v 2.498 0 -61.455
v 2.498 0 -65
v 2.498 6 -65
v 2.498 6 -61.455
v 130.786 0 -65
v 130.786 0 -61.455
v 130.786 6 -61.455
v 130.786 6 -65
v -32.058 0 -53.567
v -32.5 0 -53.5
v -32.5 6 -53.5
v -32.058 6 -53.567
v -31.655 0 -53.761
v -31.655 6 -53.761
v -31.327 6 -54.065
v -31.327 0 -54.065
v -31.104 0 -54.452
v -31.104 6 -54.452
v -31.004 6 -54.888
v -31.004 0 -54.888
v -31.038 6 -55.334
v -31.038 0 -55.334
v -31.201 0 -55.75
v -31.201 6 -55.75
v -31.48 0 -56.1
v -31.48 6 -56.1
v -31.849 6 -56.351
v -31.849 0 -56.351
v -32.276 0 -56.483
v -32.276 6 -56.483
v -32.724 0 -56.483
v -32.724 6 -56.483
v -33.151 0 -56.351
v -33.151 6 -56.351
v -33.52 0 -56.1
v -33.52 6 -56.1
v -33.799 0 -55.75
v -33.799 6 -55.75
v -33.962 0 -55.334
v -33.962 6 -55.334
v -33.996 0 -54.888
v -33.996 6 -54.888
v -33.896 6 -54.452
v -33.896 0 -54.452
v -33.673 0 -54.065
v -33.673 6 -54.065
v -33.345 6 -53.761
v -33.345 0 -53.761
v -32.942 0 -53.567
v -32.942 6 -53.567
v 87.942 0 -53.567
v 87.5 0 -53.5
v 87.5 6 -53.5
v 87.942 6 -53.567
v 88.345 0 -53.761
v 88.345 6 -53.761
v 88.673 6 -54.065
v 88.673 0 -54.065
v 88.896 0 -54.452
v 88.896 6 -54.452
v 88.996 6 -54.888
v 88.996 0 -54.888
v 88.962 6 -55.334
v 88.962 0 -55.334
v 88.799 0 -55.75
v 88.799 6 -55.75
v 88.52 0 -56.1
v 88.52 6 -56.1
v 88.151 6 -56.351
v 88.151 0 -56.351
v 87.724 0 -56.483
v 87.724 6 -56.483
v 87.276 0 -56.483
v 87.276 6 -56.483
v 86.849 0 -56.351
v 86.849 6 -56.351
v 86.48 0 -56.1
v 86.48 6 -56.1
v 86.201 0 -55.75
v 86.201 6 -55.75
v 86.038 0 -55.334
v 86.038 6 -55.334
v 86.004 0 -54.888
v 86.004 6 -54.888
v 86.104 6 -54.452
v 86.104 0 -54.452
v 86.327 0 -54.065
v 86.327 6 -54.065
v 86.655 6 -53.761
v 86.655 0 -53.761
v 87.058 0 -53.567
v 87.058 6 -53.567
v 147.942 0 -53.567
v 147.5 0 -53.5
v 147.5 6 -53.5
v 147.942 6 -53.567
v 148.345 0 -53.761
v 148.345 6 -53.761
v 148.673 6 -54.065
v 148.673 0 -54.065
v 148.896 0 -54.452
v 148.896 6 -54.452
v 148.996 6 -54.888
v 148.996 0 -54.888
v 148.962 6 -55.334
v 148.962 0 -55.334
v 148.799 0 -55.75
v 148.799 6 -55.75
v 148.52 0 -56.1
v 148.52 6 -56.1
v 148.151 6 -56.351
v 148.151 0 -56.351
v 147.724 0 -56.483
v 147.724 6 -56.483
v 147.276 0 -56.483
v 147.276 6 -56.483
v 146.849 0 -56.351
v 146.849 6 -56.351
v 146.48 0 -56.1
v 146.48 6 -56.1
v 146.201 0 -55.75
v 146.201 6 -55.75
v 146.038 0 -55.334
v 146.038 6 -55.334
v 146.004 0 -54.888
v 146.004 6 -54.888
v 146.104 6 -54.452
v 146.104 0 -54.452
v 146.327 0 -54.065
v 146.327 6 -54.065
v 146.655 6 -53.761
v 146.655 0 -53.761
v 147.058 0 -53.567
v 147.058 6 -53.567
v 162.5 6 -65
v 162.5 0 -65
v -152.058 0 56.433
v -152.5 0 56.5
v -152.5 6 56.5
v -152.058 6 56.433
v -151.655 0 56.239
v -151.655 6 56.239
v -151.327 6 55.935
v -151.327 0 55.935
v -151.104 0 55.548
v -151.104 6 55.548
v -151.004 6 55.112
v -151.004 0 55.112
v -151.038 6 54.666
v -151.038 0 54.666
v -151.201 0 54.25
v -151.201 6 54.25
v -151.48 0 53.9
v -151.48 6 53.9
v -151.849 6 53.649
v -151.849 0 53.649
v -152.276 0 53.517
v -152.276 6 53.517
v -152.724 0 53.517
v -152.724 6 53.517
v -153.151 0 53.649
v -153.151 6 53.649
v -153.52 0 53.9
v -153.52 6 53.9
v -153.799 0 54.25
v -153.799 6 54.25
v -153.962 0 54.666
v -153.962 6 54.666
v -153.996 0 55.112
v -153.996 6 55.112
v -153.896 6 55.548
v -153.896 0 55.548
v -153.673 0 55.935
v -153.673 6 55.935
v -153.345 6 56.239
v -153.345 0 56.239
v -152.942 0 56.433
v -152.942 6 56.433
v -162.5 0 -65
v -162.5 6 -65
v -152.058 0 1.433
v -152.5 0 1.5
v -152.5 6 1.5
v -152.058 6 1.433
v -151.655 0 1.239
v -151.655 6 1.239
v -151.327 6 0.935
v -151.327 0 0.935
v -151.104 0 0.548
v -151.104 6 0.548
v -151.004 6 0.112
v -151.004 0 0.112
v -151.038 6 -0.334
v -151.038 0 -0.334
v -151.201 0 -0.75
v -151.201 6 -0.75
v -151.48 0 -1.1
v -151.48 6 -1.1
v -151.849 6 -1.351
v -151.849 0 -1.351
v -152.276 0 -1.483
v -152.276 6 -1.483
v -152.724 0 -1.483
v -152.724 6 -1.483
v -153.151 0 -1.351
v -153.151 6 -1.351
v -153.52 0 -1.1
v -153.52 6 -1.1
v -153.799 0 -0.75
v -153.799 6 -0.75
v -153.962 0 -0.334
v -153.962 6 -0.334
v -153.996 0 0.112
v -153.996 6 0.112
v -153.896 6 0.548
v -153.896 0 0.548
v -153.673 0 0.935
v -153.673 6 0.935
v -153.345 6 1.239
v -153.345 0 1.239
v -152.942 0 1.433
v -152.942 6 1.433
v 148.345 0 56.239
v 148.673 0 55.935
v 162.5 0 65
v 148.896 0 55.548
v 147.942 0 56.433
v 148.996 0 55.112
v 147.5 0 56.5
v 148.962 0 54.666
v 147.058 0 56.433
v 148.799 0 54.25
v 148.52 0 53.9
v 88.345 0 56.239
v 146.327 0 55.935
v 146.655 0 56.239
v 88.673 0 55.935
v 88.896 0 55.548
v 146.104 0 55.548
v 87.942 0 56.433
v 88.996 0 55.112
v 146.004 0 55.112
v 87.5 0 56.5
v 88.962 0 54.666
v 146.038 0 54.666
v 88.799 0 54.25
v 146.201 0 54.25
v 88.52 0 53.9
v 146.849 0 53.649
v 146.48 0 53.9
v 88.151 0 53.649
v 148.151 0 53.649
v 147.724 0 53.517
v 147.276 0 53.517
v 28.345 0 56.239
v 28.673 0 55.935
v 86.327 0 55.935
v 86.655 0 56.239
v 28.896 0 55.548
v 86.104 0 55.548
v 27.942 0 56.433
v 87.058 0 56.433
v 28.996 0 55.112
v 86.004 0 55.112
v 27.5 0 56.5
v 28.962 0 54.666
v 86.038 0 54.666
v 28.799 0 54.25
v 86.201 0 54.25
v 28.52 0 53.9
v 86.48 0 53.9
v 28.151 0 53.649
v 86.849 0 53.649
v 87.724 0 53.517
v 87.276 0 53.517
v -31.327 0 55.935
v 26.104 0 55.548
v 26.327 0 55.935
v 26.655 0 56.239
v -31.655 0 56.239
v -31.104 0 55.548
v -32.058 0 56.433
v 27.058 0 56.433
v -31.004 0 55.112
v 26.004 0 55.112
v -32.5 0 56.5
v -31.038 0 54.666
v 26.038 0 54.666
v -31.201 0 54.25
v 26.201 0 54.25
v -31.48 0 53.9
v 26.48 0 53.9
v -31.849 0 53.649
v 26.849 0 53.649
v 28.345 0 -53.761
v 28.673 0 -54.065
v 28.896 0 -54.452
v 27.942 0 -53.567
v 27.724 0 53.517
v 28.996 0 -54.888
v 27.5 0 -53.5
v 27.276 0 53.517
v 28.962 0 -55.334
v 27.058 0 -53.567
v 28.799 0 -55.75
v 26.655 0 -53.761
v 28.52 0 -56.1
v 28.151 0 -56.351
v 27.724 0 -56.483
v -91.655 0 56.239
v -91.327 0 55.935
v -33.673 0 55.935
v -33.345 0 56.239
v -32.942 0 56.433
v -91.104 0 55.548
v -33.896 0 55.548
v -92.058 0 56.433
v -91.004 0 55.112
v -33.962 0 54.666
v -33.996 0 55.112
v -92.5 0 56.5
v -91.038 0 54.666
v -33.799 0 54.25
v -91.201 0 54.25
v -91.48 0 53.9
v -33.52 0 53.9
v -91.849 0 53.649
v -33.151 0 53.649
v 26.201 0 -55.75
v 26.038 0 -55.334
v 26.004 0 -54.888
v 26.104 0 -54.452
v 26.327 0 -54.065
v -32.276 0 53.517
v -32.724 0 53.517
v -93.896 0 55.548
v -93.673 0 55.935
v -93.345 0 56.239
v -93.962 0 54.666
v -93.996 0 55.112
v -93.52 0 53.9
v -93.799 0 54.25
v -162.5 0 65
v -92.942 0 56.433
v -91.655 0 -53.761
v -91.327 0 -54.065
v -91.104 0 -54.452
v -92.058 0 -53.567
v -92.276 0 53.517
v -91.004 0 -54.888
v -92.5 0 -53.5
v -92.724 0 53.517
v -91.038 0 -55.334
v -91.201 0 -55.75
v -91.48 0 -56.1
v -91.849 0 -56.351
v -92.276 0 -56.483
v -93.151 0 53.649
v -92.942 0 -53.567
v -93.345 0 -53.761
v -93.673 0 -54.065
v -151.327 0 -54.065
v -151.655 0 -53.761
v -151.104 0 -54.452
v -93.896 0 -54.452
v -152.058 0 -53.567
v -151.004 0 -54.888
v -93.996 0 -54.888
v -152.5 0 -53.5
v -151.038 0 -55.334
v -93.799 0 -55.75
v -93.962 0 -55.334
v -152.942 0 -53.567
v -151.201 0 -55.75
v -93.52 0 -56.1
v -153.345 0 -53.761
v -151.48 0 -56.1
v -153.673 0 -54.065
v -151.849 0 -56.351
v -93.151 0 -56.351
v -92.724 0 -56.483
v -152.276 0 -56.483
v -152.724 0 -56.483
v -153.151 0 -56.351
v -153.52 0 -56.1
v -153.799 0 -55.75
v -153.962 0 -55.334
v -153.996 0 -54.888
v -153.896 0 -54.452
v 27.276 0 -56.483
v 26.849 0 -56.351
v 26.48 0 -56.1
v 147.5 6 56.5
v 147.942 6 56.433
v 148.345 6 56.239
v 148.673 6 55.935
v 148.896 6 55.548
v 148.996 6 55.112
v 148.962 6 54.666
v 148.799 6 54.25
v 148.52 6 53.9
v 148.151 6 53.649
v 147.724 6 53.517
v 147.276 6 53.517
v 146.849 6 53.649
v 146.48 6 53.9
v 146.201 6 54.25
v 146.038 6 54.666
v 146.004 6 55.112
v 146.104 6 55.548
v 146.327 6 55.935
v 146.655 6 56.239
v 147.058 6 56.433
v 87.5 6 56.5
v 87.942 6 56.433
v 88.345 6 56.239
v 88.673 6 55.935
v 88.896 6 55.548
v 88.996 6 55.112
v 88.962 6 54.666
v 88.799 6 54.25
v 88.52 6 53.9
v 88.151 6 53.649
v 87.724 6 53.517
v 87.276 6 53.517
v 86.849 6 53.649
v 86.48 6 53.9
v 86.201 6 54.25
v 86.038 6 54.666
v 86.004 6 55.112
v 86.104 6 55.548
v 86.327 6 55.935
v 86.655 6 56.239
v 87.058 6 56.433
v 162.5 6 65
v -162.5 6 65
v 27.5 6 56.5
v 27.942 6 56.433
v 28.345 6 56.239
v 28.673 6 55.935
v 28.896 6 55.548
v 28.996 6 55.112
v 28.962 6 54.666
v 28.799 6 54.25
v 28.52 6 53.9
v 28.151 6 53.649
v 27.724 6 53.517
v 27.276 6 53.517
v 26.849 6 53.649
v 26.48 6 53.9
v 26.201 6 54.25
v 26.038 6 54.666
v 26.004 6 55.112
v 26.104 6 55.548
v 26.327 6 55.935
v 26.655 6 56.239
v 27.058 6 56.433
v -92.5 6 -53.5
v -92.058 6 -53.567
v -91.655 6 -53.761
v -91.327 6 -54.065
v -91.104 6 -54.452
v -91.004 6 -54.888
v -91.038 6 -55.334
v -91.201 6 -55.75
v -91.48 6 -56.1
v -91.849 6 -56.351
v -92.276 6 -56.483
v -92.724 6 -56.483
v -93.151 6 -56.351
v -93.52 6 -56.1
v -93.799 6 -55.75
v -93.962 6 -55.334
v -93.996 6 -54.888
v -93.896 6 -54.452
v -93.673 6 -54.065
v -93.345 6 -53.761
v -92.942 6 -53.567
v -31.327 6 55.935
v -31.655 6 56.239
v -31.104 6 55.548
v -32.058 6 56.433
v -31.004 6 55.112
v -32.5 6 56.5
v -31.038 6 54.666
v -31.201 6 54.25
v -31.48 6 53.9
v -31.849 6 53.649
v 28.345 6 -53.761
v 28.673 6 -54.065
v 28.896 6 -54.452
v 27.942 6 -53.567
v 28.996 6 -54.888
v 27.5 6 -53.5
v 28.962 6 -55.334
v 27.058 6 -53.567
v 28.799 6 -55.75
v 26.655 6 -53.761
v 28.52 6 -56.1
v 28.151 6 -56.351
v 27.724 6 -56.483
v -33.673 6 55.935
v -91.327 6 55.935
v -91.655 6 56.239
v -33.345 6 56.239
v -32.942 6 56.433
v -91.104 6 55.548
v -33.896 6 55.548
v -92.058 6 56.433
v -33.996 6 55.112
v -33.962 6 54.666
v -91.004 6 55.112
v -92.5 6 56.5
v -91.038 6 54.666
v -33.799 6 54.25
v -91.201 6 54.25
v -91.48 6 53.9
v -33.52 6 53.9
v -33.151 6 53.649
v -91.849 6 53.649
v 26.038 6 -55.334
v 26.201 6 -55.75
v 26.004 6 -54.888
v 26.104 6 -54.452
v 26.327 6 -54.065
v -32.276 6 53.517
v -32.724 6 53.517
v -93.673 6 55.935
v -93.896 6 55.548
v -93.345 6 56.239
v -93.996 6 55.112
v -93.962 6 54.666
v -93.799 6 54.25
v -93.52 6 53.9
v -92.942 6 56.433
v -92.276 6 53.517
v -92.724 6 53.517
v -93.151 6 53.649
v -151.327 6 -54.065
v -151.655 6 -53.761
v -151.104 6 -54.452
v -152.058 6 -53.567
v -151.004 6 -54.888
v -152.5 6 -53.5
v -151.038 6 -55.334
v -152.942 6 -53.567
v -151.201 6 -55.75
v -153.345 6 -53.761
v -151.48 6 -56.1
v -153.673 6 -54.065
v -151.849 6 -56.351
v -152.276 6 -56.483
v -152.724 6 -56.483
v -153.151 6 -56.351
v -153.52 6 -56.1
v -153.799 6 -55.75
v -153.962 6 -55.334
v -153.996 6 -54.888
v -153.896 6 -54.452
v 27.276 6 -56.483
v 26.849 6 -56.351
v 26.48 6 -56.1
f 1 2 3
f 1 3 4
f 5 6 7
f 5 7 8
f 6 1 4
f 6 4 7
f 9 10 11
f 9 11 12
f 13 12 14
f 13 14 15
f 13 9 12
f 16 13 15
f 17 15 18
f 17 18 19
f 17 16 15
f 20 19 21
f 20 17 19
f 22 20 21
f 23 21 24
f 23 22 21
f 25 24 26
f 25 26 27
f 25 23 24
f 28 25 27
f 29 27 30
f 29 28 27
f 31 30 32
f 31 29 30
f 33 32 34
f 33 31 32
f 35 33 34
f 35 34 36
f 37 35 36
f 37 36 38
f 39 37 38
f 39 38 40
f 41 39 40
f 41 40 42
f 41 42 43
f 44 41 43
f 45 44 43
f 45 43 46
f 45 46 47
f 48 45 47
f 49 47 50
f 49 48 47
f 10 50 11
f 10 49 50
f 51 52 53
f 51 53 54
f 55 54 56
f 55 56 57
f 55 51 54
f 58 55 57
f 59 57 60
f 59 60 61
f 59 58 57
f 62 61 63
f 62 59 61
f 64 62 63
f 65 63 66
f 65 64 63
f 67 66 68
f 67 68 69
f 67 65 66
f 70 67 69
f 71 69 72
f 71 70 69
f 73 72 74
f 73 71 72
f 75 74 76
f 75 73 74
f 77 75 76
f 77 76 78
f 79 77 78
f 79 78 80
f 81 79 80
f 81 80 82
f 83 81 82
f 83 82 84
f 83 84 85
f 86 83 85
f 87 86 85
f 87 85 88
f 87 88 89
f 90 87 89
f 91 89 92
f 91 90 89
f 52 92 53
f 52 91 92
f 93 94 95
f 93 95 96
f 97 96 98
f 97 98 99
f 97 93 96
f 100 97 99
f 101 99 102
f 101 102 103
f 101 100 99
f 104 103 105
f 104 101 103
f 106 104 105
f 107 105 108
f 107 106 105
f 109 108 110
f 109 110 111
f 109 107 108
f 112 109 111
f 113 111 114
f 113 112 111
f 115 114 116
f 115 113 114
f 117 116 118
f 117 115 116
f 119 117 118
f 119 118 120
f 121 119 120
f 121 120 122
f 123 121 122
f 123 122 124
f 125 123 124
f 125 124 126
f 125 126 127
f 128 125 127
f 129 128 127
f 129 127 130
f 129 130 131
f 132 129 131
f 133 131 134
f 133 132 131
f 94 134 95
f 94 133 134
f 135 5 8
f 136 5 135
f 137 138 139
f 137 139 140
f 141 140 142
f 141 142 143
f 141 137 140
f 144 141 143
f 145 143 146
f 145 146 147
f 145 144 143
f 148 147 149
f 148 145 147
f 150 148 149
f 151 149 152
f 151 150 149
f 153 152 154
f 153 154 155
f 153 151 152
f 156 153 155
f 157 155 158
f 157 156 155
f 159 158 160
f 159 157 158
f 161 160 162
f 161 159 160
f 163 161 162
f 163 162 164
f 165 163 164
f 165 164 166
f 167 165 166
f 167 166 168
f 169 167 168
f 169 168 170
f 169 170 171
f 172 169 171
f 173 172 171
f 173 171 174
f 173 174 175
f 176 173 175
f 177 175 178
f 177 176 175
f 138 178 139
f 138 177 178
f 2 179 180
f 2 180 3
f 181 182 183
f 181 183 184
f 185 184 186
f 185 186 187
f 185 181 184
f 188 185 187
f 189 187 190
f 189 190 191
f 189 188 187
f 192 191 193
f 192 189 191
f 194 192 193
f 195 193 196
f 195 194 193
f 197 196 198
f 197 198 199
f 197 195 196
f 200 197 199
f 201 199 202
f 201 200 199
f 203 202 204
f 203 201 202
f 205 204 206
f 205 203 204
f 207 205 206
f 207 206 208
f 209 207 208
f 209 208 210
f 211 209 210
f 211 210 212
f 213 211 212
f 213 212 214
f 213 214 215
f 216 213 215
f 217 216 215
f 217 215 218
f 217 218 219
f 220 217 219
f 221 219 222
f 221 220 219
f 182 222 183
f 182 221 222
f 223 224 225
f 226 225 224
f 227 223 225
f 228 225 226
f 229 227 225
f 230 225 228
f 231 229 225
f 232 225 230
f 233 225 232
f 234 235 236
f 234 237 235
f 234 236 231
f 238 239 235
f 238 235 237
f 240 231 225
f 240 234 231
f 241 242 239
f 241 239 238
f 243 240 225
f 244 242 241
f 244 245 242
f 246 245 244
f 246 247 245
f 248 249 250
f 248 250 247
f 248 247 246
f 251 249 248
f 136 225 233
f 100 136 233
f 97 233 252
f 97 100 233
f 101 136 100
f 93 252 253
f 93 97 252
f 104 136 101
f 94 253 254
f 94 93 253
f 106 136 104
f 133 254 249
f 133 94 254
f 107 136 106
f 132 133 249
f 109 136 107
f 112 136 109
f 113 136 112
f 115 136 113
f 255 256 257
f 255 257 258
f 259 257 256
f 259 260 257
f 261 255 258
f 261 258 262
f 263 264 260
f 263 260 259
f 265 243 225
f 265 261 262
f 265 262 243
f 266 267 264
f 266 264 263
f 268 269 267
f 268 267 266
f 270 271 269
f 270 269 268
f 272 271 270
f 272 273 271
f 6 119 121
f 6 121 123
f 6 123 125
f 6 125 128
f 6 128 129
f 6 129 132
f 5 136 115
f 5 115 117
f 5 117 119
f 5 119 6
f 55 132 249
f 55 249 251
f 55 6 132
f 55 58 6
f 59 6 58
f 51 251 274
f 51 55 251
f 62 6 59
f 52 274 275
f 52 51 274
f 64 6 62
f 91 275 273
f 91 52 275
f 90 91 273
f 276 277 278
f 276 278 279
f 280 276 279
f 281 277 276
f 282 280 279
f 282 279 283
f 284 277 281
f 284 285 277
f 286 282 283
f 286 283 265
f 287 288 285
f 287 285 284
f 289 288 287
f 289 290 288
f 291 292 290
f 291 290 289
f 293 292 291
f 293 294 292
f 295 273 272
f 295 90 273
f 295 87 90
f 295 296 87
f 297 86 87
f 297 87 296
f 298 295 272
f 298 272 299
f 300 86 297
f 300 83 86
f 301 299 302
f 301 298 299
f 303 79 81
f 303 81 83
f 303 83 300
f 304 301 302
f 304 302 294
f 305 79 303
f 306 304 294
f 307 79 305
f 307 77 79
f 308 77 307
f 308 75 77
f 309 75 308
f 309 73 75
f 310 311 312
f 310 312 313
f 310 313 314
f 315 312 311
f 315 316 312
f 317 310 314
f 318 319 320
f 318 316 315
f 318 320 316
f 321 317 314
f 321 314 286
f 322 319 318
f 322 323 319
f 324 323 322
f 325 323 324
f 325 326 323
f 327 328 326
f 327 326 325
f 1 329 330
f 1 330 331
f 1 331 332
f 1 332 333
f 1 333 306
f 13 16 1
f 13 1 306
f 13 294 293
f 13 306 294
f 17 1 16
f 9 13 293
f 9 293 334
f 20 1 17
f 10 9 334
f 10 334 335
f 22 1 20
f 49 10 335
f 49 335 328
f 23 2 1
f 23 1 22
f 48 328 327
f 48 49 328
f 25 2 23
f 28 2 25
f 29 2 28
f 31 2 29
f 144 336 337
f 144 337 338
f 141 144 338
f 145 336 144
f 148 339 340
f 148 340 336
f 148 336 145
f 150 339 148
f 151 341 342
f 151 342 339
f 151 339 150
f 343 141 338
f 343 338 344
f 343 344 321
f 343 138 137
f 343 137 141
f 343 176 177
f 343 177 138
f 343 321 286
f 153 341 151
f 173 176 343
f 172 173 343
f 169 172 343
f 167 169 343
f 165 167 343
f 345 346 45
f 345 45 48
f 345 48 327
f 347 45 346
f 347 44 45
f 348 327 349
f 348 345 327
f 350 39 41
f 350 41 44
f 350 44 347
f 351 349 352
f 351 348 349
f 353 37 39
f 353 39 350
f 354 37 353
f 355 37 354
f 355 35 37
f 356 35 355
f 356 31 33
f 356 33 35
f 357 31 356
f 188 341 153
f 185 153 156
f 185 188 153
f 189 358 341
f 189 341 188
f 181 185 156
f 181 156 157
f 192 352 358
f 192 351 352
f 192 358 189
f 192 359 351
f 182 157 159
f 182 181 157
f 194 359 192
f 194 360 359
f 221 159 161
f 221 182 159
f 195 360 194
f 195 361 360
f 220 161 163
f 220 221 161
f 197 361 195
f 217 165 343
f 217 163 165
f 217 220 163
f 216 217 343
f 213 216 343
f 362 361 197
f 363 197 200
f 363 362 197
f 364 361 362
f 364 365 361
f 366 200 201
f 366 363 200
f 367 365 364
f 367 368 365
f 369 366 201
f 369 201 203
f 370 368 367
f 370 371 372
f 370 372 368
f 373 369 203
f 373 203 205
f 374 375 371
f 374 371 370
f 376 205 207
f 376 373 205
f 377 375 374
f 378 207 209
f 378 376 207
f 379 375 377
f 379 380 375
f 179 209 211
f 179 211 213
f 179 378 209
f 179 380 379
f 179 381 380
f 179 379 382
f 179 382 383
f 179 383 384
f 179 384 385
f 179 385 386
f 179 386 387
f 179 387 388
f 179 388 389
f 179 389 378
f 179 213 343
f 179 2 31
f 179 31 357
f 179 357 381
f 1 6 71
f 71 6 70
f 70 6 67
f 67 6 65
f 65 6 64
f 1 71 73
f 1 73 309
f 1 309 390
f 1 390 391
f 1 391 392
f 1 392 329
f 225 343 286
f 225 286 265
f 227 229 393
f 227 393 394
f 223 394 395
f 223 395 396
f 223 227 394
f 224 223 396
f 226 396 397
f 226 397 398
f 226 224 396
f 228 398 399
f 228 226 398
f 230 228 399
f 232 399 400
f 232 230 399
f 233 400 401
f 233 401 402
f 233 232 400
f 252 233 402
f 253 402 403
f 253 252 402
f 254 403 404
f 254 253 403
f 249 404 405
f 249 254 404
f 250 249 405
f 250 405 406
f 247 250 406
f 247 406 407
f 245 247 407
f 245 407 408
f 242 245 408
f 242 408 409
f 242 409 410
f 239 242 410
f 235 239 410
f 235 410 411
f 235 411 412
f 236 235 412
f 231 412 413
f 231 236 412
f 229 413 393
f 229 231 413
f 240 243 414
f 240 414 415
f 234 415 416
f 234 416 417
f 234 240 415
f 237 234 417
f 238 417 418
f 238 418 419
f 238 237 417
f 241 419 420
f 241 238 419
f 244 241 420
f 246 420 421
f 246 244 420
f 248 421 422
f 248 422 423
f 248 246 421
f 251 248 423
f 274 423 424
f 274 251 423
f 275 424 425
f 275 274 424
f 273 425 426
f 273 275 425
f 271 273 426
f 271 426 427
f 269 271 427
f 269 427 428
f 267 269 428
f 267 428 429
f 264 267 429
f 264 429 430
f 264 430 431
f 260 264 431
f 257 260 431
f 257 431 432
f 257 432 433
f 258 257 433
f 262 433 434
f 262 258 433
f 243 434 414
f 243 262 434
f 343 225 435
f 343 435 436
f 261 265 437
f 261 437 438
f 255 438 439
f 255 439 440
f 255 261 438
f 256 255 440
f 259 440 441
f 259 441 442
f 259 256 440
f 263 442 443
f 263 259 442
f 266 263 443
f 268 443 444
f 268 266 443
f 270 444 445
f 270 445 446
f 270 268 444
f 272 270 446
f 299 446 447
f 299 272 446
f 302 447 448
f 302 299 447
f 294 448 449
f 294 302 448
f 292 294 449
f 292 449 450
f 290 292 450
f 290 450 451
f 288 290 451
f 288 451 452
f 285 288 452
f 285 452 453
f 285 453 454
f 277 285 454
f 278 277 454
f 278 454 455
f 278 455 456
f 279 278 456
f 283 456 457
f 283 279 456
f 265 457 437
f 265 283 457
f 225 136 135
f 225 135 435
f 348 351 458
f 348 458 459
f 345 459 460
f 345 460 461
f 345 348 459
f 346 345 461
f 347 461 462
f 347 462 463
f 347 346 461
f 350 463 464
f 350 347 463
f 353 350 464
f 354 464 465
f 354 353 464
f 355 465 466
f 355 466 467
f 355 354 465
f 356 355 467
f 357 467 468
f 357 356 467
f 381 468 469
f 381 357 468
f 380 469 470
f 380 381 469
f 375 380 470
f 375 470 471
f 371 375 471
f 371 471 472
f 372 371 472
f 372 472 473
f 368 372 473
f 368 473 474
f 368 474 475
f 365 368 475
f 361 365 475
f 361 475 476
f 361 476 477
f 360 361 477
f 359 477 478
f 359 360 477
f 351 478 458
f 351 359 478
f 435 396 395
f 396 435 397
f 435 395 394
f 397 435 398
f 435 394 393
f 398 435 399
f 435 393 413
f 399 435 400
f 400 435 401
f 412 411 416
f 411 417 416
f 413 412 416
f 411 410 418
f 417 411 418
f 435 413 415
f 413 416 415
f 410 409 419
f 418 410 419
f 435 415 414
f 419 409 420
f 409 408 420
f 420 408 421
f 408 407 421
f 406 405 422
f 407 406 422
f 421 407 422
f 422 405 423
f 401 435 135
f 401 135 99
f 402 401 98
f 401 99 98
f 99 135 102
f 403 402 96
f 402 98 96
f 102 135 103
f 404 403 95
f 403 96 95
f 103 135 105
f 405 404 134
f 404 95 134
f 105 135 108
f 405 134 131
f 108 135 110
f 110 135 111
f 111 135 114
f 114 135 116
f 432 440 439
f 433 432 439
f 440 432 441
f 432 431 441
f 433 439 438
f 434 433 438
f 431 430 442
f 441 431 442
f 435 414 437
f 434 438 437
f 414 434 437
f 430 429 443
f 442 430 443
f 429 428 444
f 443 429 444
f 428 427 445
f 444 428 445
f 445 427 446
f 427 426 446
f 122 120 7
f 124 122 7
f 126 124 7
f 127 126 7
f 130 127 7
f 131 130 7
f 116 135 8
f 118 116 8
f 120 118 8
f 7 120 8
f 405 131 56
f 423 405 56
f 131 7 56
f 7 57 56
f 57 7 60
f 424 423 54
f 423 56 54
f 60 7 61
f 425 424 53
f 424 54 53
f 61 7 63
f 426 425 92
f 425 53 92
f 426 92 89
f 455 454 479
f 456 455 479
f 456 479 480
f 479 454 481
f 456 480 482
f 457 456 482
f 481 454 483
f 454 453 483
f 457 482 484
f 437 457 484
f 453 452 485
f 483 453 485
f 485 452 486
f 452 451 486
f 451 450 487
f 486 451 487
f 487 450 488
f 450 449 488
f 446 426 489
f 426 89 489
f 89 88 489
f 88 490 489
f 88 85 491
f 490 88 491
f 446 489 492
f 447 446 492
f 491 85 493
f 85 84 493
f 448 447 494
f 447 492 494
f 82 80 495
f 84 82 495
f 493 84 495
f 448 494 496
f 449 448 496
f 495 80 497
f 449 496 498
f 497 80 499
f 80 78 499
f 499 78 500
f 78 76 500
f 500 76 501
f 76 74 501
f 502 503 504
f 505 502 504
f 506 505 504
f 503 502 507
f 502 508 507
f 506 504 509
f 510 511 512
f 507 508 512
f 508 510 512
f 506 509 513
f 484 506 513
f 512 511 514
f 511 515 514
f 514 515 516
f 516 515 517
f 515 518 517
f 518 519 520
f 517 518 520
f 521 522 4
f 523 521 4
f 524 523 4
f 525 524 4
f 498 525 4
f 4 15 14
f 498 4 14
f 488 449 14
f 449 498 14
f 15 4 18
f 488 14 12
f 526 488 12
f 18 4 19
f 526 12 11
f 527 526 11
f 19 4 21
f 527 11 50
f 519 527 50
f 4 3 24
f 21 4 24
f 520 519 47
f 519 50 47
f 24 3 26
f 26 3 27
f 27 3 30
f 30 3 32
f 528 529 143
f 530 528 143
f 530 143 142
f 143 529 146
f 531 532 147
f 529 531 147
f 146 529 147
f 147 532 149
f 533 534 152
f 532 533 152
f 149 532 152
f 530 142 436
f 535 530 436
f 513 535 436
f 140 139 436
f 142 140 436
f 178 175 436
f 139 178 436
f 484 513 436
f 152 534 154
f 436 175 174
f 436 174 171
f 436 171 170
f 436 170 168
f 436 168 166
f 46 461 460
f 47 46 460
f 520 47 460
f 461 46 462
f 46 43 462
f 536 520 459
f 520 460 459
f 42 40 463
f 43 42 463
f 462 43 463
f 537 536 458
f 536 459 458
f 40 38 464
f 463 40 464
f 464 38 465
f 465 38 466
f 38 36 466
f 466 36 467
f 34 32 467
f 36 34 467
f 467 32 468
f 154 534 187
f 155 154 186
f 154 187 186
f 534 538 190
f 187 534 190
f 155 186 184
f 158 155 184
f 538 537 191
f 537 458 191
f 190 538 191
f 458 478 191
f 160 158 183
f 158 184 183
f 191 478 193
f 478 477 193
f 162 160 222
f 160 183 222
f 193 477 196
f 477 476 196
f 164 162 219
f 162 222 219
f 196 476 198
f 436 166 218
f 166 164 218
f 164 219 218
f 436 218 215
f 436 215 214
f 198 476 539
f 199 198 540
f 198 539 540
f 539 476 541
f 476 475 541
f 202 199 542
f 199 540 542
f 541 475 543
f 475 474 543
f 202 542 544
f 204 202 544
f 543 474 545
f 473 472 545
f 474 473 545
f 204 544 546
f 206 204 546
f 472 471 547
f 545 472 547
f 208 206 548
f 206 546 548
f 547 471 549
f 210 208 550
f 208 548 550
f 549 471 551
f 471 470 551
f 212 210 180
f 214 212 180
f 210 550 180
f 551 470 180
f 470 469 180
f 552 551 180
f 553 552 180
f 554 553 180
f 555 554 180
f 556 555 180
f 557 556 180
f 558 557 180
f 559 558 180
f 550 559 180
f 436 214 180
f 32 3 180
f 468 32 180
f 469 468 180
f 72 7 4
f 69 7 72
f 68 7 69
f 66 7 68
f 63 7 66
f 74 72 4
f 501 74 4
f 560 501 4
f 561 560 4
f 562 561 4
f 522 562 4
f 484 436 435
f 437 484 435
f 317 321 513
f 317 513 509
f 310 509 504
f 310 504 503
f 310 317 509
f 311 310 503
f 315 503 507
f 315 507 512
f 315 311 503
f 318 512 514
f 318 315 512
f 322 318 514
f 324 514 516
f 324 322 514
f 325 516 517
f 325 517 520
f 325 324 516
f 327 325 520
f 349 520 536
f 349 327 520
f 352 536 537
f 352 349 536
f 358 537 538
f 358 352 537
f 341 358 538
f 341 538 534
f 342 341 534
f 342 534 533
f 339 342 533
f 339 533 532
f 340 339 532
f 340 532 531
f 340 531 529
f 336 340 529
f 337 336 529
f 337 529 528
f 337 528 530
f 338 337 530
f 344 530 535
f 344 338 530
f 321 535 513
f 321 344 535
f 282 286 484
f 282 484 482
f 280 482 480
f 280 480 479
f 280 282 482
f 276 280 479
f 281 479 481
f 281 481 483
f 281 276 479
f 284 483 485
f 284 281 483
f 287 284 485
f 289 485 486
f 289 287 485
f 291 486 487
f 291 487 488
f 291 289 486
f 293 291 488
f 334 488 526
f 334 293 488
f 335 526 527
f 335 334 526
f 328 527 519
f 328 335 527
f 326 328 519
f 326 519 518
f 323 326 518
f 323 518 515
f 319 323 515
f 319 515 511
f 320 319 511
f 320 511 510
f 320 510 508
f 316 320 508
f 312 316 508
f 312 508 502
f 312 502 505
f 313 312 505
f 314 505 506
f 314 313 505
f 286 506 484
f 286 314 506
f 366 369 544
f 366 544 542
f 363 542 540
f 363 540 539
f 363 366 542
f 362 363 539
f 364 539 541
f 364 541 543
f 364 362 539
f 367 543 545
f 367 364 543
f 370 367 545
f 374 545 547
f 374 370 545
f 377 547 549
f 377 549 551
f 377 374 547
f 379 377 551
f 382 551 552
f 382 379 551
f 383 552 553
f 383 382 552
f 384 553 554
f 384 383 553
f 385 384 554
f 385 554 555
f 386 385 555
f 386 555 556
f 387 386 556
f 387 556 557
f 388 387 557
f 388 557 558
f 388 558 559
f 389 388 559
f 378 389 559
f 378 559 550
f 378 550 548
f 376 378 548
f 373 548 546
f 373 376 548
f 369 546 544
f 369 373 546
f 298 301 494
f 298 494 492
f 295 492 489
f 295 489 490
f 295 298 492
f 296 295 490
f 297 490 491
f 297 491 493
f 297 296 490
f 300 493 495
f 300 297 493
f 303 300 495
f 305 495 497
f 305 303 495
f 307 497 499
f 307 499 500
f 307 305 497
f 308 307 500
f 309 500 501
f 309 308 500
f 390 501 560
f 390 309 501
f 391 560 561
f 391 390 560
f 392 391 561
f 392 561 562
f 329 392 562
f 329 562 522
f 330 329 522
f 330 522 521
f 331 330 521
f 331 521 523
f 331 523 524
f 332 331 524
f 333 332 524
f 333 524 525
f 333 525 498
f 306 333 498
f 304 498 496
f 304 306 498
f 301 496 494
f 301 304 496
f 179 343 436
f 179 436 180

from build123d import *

# Parameters (mm, degrees)
SKETCH_1_R      = 1.5
EXTRUDE_1_DEPTH = 6


with BuildPart() as part:
    # 草图1 → 凸台-拉伸1 (new body)
    with BuildSketch(Plane(origin=(0, 0, 0), x_dir=(1, 0, 0), z_dir=(0, 1, 0))):
        Polygon((-162.5, 65), (2.497803149, 65), (2.497803149, 61.454616174), (130.785768407, 61.454616174), (130.785768407, 65), (162.5, 65), (162.5, -65), (-162.5, -65), align=None)
        with Locations(Location((-152.5, 55, 0), (0, 0, 270))):
            Circle(SKETCH_1_R, mode=Mode.SUBTRACT)
        with Locations(Location((-152.5, -55, 0), (0, 0, 270))):
            Circle(SKETCH_1_R, mode=Mode.SUBTRACT)
        with Locations(Location((-92.5, 55, 0), (0, 0, 270))):
            Circle(SKETCH_1_R, mode=Mode.SUBTRACT)
        with Locations(Location((-32.5, 55, 0), (0, 0, 270))):
            Circle(SKETCH_1_R, mode=Mode.SUBTRACT)
        with Locations(Location((27.5, 55, 0), (0, 0, 270))):
            Circle(SKETCH_1_R, mode=Mode.SUBTRACT)
        with Locations(Location((87.5, 55, 0), (0, 0, 270))):
            Circle(SKETCH_1_R, mode=Mode.SUBTRACT)
        with Locations(Location((147.5, 55, 0), (0, 0, 270))):
            Circle(SKETCH_1_R, mode=Mode.SUBTRACT)
        with Locations(Location((-92.5, -55, 0), (0, 0, 270))):
            Circle(SKETCH_1_R, mode=Mode.SUBTRACT)
        with Locations(Location((-32.5, -55, 0), (0, 0, 270))):
            Circle(SKETCH_1_R, mode=Mode.SUBTRACT)
        with Locations(Location((27.5, -55, 0), (0, 0, 270))):
            Circle(SKETCH_1_R, mode=Mode.SUBTRACT)
        with Locations(Location((87.5, -55, 0), (0, 0, 270))):
            Circle(SKETCH_1_R, mode=Mode.SUBTRACT)
        with Locations(Location((147.5, -55, 0), (0, 0, 270))):
            Circle(SKETCH_1_R, mode=Mode.SUBTRACT)
        with Locations(Location((-152.5, 0, 0), (0, 0, 270))):
            Circle(SKETCH_1_R, mode=Mode.SUBTRACT)
    extrude(amount=EXTRUDE_1_DEPTH)


solid = part.part
